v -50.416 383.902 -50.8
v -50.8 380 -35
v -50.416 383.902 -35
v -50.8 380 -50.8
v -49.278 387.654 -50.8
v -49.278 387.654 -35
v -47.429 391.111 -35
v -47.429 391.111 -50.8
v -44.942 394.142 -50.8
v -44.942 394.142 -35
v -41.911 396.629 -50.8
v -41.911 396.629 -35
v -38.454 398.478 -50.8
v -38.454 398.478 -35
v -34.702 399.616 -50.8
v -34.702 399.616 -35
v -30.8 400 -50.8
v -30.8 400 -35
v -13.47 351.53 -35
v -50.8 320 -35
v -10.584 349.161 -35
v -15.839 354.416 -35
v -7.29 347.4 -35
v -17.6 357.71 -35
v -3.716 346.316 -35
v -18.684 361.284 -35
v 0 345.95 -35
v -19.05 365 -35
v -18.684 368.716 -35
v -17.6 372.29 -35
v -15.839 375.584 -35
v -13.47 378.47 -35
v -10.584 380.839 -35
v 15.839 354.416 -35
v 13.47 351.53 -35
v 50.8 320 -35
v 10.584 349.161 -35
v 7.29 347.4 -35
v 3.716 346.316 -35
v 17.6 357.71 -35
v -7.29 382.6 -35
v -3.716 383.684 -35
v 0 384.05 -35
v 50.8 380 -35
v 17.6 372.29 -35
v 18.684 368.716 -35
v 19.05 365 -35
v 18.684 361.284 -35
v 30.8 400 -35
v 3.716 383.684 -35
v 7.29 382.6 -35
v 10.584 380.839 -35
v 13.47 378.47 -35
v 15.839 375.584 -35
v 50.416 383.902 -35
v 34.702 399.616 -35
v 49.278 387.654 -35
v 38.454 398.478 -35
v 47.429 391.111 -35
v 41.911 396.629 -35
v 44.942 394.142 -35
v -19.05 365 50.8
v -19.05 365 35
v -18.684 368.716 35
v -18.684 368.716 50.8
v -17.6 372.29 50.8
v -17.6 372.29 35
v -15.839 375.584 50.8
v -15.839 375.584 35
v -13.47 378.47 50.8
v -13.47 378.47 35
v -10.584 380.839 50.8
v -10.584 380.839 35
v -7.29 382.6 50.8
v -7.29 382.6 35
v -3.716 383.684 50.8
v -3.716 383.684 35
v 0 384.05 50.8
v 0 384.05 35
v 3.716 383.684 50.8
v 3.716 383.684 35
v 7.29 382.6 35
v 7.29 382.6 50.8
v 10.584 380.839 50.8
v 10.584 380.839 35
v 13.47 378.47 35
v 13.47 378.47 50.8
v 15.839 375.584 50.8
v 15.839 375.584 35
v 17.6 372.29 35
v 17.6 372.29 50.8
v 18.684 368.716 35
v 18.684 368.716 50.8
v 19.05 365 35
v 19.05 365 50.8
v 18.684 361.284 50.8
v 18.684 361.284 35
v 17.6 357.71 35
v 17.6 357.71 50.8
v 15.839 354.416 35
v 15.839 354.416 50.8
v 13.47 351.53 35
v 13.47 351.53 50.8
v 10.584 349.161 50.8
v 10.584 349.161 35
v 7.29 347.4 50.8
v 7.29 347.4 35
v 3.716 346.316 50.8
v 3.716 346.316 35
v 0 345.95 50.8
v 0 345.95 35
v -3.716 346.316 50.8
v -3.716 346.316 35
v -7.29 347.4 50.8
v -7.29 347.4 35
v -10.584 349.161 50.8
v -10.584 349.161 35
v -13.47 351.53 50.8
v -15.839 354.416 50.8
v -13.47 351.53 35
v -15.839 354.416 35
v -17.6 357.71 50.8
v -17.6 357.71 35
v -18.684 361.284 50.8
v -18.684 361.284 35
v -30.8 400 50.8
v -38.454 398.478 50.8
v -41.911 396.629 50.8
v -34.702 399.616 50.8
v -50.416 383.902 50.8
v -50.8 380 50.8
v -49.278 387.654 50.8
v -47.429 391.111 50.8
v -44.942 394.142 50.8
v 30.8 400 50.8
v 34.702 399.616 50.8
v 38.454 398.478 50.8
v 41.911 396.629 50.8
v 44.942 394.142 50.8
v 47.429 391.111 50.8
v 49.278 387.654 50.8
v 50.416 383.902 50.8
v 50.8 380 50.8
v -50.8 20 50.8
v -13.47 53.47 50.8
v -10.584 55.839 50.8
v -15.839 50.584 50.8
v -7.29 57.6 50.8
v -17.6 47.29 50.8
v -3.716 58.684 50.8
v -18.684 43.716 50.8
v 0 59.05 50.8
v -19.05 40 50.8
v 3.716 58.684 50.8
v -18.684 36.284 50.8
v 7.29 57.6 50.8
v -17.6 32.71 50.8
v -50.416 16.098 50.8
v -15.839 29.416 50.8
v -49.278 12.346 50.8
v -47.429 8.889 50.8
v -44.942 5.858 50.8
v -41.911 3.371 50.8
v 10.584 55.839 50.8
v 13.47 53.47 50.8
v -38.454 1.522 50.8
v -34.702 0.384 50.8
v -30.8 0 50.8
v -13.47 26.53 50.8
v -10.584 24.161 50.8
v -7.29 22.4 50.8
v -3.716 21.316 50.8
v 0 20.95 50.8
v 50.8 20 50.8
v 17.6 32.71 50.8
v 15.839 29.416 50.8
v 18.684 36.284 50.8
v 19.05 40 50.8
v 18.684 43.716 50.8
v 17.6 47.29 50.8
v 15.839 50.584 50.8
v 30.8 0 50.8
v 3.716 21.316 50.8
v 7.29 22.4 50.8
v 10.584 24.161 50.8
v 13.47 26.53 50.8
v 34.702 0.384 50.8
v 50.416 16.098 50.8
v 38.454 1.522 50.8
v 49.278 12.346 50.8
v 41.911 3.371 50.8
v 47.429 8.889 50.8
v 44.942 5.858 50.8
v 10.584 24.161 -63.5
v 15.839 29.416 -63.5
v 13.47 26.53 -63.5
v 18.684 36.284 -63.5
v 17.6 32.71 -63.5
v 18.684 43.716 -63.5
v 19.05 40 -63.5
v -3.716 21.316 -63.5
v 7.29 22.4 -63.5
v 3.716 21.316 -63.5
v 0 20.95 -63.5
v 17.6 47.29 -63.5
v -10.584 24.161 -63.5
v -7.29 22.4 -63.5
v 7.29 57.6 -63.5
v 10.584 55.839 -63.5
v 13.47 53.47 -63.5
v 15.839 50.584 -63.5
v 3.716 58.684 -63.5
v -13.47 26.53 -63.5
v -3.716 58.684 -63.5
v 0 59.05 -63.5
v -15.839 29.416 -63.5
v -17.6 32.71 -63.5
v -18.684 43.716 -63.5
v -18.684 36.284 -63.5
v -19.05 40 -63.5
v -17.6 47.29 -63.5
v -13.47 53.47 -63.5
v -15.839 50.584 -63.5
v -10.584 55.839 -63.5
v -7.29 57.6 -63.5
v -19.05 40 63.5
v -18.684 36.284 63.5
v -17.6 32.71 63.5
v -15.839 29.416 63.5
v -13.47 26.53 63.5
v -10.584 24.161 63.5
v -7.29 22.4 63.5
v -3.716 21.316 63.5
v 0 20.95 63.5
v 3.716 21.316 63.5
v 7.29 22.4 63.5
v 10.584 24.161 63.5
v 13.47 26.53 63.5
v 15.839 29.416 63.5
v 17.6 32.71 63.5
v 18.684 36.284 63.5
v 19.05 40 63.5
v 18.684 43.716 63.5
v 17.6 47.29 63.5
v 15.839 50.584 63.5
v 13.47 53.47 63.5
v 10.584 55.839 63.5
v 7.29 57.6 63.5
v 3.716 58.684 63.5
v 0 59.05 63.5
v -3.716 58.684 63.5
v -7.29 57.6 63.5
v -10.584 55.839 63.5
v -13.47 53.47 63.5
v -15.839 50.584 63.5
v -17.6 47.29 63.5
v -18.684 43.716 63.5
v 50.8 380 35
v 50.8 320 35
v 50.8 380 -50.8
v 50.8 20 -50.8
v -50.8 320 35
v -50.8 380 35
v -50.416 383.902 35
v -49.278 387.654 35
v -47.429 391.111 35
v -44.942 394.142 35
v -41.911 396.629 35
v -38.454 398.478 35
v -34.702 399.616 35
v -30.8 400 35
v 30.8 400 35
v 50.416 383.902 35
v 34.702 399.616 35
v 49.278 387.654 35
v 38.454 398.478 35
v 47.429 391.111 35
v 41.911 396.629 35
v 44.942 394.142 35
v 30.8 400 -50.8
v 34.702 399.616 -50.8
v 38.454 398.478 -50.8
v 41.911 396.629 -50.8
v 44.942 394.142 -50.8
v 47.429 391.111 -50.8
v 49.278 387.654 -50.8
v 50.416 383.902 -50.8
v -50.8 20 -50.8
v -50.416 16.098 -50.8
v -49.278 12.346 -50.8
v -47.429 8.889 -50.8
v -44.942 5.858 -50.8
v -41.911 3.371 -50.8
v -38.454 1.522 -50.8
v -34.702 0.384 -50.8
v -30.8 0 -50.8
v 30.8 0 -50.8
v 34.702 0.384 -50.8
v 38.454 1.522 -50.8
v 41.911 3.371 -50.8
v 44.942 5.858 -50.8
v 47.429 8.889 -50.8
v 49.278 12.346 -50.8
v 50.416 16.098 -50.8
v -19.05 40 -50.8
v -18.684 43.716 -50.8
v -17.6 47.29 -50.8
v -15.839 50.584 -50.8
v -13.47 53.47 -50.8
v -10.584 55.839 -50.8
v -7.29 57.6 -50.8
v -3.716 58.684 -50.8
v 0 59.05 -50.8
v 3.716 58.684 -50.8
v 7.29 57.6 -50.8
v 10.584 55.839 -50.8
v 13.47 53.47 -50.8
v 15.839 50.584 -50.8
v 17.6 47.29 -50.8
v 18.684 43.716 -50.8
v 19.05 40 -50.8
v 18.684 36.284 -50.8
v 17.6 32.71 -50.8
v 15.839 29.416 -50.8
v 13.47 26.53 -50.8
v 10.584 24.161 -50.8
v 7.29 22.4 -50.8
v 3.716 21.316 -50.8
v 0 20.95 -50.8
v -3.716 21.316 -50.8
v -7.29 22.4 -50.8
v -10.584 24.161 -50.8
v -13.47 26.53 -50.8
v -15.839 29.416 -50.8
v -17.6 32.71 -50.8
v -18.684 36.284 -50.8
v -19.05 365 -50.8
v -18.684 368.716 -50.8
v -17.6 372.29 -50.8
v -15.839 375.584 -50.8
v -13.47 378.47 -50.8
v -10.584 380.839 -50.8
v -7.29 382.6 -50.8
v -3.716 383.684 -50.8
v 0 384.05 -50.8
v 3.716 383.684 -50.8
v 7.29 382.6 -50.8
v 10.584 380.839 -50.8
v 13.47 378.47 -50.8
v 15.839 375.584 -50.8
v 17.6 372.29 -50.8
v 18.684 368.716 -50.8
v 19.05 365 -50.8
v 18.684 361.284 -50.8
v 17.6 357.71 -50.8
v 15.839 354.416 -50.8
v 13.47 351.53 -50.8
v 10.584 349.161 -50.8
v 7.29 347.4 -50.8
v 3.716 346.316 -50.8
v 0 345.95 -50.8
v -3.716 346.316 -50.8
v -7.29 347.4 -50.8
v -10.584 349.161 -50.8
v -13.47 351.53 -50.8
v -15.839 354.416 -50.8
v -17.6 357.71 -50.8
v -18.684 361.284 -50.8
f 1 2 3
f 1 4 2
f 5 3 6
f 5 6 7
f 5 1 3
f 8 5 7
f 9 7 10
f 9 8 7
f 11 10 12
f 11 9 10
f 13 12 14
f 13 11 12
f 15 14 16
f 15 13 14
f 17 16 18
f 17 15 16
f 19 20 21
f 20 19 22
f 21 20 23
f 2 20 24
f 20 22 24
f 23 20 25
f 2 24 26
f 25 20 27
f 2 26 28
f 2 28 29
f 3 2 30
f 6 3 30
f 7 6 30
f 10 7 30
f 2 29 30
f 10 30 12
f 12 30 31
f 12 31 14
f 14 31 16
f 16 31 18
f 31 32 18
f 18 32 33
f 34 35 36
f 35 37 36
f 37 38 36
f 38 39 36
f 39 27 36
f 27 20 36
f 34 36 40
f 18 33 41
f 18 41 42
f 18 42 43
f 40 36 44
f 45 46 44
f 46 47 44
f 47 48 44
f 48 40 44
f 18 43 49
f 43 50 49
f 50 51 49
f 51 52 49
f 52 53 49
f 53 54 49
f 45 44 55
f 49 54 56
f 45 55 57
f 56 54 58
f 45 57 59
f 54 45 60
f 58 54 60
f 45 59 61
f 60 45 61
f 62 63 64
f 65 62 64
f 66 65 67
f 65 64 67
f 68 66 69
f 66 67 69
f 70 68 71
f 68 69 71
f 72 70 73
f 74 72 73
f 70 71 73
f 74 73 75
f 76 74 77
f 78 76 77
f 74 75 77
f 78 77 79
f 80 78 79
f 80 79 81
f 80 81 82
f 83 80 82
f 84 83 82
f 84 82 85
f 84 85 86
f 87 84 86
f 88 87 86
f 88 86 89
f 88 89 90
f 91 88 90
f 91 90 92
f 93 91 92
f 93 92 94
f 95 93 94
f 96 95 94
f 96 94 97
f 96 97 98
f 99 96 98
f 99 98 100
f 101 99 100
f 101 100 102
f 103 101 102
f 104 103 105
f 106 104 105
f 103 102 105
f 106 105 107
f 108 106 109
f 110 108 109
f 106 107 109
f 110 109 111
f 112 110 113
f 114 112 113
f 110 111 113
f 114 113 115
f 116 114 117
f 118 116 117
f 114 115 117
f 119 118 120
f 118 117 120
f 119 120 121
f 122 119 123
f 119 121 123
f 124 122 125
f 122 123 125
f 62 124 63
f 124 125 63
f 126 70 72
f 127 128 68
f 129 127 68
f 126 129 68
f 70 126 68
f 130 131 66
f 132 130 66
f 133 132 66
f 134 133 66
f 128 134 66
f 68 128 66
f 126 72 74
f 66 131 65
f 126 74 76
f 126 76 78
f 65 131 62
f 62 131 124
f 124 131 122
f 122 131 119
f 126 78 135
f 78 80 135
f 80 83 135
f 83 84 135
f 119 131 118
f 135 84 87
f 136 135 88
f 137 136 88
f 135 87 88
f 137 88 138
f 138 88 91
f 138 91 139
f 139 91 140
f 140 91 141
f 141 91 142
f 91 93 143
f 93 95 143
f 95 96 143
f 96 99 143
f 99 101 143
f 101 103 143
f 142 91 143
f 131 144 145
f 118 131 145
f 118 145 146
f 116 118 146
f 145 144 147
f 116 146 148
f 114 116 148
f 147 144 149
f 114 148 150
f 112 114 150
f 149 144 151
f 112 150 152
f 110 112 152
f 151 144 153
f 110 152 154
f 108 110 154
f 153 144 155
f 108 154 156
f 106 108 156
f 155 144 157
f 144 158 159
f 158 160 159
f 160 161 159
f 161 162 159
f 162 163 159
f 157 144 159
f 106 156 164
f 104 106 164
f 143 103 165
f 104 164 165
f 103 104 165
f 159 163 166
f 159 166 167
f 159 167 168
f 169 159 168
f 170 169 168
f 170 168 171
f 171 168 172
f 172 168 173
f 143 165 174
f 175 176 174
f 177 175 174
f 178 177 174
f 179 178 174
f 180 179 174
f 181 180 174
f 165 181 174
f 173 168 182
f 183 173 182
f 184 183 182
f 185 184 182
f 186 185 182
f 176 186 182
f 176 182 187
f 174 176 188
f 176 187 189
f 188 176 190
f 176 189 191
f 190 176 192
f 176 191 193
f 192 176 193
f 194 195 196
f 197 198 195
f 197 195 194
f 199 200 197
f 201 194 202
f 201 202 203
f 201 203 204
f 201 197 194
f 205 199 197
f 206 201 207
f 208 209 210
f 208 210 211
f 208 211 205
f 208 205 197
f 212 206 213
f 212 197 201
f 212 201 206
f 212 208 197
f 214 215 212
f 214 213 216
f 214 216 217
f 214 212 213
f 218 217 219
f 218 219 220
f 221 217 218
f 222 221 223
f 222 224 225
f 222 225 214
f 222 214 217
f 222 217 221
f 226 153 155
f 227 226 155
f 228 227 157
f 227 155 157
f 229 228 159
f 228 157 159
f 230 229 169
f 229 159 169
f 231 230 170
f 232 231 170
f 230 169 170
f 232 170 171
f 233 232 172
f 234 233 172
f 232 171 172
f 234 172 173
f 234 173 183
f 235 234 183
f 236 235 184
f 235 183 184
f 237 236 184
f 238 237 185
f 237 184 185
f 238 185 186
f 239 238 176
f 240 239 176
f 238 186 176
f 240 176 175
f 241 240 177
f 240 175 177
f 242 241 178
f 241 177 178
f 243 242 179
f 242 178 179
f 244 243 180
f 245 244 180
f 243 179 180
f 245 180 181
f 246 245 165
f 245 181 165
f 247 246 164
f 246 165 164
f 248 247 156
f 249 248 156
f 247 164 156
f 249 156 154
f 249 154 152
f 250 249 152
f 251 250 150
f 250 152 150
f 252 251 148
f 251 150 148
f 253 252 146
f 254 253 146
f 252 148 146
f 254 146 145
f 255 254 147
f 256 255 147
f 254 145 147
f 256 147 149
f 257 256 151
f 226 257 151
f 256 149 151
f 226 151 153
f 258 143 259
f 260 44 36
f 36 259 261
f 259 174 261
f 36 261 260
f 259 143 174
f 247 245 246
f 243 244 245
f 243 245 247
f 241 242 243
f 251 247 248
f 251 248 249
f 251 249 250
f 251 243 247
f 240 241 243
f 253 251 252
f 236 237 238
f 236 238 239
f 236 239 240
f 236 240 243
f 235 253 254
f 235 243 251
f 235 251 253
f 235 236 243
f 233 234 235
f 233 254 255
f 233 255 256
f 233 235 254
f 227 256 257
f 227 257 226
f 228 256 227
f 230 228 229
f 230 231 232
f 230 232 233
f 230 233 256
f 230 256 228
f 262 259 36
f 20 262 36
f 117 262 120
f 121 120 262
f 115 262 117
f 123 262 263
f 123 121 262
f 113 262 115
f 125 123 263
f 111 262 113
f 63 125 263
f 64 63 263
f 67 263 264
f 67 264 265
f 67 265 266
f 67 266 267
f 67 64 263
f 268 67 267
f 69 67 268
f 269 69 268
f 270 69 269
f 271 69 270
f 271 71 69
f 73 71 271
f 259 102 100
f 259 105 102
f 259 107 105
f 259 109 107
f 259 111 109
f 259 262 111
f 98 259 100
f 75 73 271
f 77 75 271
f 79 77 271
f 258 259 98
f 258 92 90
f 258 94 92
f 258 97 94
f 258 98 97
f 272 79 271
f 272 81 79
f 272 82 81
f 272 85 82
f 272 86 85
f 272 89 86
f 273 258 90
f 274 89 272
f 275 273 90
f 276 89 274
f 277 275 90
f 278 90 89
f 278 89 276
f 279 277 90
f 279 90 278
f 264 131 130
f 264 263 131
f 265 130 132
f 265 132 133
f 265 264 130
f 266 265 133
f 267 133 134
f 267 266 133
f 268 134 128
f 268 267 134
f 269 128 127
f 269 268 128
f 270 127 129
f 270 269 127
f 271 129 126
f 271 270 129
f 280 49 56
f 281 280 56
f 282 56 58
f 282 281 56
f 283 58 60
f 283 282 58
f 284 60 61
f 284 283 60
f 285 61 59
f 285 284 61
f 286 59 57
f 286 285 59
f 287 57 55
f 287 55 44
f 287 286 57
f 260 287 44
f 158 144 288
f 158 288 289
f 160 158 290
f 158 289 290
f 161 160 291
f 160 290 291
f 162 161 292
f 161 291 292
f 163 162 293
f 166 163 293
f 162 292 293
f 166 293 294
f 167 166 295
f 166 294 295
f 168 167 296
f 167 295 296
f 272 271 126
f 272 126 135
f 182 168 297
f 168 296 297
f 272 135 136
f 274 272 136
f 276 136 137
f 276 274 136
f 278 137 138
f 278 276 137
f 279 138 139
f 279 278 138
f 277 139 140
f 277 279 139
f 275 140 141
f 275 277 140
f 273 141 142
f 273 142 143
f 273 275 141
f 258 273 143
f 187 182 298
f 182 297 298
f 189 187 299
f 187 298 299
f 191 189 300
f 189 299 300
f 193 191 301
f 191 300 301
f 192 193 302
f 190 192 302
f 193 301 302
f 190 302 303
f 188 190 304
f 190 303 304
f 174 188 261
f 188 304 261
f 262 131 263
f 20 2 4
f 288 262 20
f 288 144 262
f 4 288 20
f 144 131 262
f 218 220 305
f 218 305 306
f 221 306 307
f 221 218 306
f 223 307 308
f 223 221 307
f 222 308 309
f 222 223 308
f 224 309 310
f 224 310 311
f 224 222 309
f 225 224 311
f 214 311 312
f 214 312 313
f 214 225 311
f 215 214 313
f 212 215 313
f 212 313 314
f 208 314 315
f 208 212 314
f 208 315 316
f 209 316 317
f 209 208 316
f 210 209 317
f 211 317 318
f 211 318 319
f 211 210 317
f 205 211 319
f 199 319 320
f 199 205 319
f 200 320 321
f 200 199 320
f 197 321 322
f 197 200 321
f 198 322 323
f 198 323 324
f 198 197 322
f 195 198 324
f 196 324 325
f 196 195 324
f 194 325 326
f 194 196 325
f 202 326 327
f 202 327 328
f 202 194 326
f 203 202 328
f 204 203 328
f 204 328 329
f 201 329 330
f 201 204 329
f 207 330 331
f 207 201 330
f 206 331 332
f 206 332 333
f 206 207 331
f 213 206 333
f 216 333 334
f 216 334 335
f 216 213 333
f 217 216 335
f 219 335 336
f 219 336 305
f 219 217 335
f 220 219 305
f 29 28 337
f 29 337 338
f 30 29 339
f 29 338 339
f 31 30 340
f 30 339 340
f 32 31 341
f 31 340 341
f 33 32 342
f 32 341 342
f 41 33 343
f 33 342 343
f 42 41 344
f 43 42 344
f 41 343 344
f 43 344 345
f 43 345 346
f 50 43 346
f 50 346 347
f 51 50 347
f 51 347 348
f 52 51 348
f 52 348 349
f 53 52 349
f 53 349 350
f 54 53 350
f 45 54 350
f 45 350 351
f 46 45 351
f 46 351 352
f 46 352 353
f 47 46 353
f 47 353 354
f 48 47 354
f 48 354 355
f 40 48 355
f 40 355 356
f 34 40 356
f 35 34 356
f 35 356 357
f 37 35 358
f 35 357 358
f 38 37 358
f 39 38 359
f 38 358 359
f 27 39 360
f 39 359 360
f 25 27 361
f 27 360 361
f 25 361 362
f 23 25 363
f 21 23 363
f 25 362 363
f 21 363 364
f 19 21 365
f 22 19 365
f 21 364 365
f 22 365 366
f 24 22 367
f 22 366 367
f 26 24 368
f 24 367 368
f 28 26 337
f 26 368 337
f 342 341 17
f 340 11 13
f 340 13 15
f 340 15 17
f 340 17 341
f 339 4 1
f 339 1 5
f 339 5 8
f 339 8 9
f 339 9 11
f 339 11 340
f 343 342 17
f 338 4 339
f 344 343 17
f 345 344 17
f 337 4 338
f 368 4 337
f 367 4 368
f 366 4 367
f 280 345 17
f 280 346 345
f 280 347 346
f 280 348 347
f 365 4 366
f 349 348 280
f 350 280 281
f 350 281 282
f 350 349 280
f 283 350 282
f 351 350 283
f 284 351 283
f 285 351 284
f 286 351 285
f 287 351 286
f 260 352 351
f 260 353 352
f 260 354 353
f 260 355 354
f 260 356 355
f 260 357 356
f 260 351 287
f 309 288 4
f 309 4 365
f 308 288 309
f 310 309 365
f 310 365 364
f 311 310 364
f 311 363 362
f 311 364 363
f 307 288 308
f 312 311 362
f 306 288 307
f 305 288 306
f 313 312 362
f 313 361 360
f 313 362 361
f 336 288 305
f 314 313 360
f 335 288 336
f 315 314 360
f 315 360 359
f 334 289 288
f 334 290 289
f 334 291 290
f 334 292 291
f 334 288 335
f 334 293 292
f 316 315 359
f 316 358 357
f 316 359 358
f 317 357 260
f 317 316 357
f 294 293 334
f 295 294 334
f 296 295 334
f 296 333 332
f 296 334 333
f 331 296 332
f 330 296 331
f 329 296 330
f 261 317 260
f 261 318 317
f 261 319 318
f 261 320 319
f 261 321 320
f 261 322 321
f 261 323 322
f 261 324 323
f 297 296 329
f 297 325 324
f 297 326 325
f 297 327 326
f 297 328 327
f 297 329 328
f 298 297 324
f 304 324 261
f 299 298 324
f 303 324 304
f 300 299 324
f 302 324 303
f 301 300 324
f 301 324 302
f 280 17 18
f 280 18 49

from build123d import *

# Parameters (mm, degrees)
CROQUIS1_W              = 101.6
CROQUIS1_H              = 101.6
SALIENTE_EXTRUIR1_DEPTH = 400
CROQUIS2_R              = 19.05
SALIENTE_EXTRUIR2_DEPTH = 12.7
SALIENTE_EXTRUIR3_START = 12.7
CROQUIS3_R              = 19.05
SALIENTE_EXTRUIR3_DEPTH = 12.7
REDONDEO1_R             = 20
CROQUIS5_W              = 70
CROQUIS5_H              = 80
CORTAR_EXTRUIR1_DEPTH   = 101.6
CORTAR_EXTRUIR2_REACH   = 421.1
CROQUIS6_R              = 19.05
REDONDEO2_R             = 20


with BuildPart() as part:
    # Croquis1 → Saliente-Extruir1 (new body)
    with BuildSketch(Plane(origin=(0, 0, 0), x_dir=(1, 0, 0), z_dir=(0, 1, 0))):
        Rectangle(CROQUIS1_W, CROQUIS1_H)
    extrude(amount=SALIENTE_EXTRUIR1_DEPTH)

    # Croquis2 → Saliente-Extruir2 (add)
    with BuildSketch(Plane.XY.offset(50.8)):
        with Locations(Location((0, 40, 0), (0, 0, 180))):
            Circle(CROQUIS2_R)
    extrude(amount=SALIENTE_EXTRUIR2_DEPTH)

    # Croquis3 → Saliente-Extruir3 (add)
    with BuildSketch(Plane(origin=(0, 0, -50.8), x_dir=(-1, 0, 0), z_dir=(0, 0, -1)).offset(SALIENTE_EXTRUIR3_START)):
        with Locations((0, 40)):
            Circle(CROQUIS3_R)
    extrude(amount=-SALIENTE_EXTRUIR3_DEPTH)

    # Redondeo1
    redondeo1_edges = [part.edges().sort_by_distance(p)[0] for p in [
        (-50.8, 0, 0),
        (50.8, 0, 0),
    ]]
    fillet(redondeo1_edges, radius=REDONDEO1_R)

    # Croquis5 → Cortar-Extruir1 (cut)
    with BuildSketch(Plane(origin=(50.8, 0, 0), x_dir=(0, 0, -1), z_dir=(1, 0, 0))):
        with Locations((0, 360)):
            Rectangle(CROQUIS5_W, CROQUIS5_H)
    extrude(amount=-CORTAR_EXTRUIR1_DEPTH, mode=Mode.SUBTRACT)

    # Cortar-Extruir2: up to this face of the body (flat: up to its plane)
    cortar_extruir2_end = Plane(part.part.faces().sort_by_distance((0, 205.491832247, 50.8))[0])
    # Croquis6 → Cortar-Extruir2 (cut, up to the picked face)
    with BuildSketch(Plane(origin=(0, 0, -50.8), x_dir=(-1, 0, 0), z_dir=(0, 0, -1)), mode=Mode.PRIVATE) as cortar_extruir2_sk1:
        with Locations((0, 365)):
            Circle(CROQUIS6_R)
    cortar_extruir2_tool1 = split(extrude(cortar_extruir2_sk1.sketch, amount=-CORTAR_EXTRUIR2_REACH, mode=Mode.PRIVATE), bisect_by=cortar_extruir2_end, keep=Keep.BOTH, mode=Mode.PRIVATE)
    add(cortar_extruir2_tool1.solids().sort_by(Axis((0, 365, -50.8), (0, 0, 1)))[0], mode=Mode.SUBTRACT)

    # Redondeo2
    redondeo2_edges = [part.edges().sort_by_distance(p)[0] for p in [
        (-50.8, 400, -42.9),
        (50.8, 400, -42.9),
        (-50.8, 400, 42.9),
        (50.8, 400, 42.9),
    ]]
    fillet(redondeo2_edges, radius=REDONDEO2_R)


solid = part.part
